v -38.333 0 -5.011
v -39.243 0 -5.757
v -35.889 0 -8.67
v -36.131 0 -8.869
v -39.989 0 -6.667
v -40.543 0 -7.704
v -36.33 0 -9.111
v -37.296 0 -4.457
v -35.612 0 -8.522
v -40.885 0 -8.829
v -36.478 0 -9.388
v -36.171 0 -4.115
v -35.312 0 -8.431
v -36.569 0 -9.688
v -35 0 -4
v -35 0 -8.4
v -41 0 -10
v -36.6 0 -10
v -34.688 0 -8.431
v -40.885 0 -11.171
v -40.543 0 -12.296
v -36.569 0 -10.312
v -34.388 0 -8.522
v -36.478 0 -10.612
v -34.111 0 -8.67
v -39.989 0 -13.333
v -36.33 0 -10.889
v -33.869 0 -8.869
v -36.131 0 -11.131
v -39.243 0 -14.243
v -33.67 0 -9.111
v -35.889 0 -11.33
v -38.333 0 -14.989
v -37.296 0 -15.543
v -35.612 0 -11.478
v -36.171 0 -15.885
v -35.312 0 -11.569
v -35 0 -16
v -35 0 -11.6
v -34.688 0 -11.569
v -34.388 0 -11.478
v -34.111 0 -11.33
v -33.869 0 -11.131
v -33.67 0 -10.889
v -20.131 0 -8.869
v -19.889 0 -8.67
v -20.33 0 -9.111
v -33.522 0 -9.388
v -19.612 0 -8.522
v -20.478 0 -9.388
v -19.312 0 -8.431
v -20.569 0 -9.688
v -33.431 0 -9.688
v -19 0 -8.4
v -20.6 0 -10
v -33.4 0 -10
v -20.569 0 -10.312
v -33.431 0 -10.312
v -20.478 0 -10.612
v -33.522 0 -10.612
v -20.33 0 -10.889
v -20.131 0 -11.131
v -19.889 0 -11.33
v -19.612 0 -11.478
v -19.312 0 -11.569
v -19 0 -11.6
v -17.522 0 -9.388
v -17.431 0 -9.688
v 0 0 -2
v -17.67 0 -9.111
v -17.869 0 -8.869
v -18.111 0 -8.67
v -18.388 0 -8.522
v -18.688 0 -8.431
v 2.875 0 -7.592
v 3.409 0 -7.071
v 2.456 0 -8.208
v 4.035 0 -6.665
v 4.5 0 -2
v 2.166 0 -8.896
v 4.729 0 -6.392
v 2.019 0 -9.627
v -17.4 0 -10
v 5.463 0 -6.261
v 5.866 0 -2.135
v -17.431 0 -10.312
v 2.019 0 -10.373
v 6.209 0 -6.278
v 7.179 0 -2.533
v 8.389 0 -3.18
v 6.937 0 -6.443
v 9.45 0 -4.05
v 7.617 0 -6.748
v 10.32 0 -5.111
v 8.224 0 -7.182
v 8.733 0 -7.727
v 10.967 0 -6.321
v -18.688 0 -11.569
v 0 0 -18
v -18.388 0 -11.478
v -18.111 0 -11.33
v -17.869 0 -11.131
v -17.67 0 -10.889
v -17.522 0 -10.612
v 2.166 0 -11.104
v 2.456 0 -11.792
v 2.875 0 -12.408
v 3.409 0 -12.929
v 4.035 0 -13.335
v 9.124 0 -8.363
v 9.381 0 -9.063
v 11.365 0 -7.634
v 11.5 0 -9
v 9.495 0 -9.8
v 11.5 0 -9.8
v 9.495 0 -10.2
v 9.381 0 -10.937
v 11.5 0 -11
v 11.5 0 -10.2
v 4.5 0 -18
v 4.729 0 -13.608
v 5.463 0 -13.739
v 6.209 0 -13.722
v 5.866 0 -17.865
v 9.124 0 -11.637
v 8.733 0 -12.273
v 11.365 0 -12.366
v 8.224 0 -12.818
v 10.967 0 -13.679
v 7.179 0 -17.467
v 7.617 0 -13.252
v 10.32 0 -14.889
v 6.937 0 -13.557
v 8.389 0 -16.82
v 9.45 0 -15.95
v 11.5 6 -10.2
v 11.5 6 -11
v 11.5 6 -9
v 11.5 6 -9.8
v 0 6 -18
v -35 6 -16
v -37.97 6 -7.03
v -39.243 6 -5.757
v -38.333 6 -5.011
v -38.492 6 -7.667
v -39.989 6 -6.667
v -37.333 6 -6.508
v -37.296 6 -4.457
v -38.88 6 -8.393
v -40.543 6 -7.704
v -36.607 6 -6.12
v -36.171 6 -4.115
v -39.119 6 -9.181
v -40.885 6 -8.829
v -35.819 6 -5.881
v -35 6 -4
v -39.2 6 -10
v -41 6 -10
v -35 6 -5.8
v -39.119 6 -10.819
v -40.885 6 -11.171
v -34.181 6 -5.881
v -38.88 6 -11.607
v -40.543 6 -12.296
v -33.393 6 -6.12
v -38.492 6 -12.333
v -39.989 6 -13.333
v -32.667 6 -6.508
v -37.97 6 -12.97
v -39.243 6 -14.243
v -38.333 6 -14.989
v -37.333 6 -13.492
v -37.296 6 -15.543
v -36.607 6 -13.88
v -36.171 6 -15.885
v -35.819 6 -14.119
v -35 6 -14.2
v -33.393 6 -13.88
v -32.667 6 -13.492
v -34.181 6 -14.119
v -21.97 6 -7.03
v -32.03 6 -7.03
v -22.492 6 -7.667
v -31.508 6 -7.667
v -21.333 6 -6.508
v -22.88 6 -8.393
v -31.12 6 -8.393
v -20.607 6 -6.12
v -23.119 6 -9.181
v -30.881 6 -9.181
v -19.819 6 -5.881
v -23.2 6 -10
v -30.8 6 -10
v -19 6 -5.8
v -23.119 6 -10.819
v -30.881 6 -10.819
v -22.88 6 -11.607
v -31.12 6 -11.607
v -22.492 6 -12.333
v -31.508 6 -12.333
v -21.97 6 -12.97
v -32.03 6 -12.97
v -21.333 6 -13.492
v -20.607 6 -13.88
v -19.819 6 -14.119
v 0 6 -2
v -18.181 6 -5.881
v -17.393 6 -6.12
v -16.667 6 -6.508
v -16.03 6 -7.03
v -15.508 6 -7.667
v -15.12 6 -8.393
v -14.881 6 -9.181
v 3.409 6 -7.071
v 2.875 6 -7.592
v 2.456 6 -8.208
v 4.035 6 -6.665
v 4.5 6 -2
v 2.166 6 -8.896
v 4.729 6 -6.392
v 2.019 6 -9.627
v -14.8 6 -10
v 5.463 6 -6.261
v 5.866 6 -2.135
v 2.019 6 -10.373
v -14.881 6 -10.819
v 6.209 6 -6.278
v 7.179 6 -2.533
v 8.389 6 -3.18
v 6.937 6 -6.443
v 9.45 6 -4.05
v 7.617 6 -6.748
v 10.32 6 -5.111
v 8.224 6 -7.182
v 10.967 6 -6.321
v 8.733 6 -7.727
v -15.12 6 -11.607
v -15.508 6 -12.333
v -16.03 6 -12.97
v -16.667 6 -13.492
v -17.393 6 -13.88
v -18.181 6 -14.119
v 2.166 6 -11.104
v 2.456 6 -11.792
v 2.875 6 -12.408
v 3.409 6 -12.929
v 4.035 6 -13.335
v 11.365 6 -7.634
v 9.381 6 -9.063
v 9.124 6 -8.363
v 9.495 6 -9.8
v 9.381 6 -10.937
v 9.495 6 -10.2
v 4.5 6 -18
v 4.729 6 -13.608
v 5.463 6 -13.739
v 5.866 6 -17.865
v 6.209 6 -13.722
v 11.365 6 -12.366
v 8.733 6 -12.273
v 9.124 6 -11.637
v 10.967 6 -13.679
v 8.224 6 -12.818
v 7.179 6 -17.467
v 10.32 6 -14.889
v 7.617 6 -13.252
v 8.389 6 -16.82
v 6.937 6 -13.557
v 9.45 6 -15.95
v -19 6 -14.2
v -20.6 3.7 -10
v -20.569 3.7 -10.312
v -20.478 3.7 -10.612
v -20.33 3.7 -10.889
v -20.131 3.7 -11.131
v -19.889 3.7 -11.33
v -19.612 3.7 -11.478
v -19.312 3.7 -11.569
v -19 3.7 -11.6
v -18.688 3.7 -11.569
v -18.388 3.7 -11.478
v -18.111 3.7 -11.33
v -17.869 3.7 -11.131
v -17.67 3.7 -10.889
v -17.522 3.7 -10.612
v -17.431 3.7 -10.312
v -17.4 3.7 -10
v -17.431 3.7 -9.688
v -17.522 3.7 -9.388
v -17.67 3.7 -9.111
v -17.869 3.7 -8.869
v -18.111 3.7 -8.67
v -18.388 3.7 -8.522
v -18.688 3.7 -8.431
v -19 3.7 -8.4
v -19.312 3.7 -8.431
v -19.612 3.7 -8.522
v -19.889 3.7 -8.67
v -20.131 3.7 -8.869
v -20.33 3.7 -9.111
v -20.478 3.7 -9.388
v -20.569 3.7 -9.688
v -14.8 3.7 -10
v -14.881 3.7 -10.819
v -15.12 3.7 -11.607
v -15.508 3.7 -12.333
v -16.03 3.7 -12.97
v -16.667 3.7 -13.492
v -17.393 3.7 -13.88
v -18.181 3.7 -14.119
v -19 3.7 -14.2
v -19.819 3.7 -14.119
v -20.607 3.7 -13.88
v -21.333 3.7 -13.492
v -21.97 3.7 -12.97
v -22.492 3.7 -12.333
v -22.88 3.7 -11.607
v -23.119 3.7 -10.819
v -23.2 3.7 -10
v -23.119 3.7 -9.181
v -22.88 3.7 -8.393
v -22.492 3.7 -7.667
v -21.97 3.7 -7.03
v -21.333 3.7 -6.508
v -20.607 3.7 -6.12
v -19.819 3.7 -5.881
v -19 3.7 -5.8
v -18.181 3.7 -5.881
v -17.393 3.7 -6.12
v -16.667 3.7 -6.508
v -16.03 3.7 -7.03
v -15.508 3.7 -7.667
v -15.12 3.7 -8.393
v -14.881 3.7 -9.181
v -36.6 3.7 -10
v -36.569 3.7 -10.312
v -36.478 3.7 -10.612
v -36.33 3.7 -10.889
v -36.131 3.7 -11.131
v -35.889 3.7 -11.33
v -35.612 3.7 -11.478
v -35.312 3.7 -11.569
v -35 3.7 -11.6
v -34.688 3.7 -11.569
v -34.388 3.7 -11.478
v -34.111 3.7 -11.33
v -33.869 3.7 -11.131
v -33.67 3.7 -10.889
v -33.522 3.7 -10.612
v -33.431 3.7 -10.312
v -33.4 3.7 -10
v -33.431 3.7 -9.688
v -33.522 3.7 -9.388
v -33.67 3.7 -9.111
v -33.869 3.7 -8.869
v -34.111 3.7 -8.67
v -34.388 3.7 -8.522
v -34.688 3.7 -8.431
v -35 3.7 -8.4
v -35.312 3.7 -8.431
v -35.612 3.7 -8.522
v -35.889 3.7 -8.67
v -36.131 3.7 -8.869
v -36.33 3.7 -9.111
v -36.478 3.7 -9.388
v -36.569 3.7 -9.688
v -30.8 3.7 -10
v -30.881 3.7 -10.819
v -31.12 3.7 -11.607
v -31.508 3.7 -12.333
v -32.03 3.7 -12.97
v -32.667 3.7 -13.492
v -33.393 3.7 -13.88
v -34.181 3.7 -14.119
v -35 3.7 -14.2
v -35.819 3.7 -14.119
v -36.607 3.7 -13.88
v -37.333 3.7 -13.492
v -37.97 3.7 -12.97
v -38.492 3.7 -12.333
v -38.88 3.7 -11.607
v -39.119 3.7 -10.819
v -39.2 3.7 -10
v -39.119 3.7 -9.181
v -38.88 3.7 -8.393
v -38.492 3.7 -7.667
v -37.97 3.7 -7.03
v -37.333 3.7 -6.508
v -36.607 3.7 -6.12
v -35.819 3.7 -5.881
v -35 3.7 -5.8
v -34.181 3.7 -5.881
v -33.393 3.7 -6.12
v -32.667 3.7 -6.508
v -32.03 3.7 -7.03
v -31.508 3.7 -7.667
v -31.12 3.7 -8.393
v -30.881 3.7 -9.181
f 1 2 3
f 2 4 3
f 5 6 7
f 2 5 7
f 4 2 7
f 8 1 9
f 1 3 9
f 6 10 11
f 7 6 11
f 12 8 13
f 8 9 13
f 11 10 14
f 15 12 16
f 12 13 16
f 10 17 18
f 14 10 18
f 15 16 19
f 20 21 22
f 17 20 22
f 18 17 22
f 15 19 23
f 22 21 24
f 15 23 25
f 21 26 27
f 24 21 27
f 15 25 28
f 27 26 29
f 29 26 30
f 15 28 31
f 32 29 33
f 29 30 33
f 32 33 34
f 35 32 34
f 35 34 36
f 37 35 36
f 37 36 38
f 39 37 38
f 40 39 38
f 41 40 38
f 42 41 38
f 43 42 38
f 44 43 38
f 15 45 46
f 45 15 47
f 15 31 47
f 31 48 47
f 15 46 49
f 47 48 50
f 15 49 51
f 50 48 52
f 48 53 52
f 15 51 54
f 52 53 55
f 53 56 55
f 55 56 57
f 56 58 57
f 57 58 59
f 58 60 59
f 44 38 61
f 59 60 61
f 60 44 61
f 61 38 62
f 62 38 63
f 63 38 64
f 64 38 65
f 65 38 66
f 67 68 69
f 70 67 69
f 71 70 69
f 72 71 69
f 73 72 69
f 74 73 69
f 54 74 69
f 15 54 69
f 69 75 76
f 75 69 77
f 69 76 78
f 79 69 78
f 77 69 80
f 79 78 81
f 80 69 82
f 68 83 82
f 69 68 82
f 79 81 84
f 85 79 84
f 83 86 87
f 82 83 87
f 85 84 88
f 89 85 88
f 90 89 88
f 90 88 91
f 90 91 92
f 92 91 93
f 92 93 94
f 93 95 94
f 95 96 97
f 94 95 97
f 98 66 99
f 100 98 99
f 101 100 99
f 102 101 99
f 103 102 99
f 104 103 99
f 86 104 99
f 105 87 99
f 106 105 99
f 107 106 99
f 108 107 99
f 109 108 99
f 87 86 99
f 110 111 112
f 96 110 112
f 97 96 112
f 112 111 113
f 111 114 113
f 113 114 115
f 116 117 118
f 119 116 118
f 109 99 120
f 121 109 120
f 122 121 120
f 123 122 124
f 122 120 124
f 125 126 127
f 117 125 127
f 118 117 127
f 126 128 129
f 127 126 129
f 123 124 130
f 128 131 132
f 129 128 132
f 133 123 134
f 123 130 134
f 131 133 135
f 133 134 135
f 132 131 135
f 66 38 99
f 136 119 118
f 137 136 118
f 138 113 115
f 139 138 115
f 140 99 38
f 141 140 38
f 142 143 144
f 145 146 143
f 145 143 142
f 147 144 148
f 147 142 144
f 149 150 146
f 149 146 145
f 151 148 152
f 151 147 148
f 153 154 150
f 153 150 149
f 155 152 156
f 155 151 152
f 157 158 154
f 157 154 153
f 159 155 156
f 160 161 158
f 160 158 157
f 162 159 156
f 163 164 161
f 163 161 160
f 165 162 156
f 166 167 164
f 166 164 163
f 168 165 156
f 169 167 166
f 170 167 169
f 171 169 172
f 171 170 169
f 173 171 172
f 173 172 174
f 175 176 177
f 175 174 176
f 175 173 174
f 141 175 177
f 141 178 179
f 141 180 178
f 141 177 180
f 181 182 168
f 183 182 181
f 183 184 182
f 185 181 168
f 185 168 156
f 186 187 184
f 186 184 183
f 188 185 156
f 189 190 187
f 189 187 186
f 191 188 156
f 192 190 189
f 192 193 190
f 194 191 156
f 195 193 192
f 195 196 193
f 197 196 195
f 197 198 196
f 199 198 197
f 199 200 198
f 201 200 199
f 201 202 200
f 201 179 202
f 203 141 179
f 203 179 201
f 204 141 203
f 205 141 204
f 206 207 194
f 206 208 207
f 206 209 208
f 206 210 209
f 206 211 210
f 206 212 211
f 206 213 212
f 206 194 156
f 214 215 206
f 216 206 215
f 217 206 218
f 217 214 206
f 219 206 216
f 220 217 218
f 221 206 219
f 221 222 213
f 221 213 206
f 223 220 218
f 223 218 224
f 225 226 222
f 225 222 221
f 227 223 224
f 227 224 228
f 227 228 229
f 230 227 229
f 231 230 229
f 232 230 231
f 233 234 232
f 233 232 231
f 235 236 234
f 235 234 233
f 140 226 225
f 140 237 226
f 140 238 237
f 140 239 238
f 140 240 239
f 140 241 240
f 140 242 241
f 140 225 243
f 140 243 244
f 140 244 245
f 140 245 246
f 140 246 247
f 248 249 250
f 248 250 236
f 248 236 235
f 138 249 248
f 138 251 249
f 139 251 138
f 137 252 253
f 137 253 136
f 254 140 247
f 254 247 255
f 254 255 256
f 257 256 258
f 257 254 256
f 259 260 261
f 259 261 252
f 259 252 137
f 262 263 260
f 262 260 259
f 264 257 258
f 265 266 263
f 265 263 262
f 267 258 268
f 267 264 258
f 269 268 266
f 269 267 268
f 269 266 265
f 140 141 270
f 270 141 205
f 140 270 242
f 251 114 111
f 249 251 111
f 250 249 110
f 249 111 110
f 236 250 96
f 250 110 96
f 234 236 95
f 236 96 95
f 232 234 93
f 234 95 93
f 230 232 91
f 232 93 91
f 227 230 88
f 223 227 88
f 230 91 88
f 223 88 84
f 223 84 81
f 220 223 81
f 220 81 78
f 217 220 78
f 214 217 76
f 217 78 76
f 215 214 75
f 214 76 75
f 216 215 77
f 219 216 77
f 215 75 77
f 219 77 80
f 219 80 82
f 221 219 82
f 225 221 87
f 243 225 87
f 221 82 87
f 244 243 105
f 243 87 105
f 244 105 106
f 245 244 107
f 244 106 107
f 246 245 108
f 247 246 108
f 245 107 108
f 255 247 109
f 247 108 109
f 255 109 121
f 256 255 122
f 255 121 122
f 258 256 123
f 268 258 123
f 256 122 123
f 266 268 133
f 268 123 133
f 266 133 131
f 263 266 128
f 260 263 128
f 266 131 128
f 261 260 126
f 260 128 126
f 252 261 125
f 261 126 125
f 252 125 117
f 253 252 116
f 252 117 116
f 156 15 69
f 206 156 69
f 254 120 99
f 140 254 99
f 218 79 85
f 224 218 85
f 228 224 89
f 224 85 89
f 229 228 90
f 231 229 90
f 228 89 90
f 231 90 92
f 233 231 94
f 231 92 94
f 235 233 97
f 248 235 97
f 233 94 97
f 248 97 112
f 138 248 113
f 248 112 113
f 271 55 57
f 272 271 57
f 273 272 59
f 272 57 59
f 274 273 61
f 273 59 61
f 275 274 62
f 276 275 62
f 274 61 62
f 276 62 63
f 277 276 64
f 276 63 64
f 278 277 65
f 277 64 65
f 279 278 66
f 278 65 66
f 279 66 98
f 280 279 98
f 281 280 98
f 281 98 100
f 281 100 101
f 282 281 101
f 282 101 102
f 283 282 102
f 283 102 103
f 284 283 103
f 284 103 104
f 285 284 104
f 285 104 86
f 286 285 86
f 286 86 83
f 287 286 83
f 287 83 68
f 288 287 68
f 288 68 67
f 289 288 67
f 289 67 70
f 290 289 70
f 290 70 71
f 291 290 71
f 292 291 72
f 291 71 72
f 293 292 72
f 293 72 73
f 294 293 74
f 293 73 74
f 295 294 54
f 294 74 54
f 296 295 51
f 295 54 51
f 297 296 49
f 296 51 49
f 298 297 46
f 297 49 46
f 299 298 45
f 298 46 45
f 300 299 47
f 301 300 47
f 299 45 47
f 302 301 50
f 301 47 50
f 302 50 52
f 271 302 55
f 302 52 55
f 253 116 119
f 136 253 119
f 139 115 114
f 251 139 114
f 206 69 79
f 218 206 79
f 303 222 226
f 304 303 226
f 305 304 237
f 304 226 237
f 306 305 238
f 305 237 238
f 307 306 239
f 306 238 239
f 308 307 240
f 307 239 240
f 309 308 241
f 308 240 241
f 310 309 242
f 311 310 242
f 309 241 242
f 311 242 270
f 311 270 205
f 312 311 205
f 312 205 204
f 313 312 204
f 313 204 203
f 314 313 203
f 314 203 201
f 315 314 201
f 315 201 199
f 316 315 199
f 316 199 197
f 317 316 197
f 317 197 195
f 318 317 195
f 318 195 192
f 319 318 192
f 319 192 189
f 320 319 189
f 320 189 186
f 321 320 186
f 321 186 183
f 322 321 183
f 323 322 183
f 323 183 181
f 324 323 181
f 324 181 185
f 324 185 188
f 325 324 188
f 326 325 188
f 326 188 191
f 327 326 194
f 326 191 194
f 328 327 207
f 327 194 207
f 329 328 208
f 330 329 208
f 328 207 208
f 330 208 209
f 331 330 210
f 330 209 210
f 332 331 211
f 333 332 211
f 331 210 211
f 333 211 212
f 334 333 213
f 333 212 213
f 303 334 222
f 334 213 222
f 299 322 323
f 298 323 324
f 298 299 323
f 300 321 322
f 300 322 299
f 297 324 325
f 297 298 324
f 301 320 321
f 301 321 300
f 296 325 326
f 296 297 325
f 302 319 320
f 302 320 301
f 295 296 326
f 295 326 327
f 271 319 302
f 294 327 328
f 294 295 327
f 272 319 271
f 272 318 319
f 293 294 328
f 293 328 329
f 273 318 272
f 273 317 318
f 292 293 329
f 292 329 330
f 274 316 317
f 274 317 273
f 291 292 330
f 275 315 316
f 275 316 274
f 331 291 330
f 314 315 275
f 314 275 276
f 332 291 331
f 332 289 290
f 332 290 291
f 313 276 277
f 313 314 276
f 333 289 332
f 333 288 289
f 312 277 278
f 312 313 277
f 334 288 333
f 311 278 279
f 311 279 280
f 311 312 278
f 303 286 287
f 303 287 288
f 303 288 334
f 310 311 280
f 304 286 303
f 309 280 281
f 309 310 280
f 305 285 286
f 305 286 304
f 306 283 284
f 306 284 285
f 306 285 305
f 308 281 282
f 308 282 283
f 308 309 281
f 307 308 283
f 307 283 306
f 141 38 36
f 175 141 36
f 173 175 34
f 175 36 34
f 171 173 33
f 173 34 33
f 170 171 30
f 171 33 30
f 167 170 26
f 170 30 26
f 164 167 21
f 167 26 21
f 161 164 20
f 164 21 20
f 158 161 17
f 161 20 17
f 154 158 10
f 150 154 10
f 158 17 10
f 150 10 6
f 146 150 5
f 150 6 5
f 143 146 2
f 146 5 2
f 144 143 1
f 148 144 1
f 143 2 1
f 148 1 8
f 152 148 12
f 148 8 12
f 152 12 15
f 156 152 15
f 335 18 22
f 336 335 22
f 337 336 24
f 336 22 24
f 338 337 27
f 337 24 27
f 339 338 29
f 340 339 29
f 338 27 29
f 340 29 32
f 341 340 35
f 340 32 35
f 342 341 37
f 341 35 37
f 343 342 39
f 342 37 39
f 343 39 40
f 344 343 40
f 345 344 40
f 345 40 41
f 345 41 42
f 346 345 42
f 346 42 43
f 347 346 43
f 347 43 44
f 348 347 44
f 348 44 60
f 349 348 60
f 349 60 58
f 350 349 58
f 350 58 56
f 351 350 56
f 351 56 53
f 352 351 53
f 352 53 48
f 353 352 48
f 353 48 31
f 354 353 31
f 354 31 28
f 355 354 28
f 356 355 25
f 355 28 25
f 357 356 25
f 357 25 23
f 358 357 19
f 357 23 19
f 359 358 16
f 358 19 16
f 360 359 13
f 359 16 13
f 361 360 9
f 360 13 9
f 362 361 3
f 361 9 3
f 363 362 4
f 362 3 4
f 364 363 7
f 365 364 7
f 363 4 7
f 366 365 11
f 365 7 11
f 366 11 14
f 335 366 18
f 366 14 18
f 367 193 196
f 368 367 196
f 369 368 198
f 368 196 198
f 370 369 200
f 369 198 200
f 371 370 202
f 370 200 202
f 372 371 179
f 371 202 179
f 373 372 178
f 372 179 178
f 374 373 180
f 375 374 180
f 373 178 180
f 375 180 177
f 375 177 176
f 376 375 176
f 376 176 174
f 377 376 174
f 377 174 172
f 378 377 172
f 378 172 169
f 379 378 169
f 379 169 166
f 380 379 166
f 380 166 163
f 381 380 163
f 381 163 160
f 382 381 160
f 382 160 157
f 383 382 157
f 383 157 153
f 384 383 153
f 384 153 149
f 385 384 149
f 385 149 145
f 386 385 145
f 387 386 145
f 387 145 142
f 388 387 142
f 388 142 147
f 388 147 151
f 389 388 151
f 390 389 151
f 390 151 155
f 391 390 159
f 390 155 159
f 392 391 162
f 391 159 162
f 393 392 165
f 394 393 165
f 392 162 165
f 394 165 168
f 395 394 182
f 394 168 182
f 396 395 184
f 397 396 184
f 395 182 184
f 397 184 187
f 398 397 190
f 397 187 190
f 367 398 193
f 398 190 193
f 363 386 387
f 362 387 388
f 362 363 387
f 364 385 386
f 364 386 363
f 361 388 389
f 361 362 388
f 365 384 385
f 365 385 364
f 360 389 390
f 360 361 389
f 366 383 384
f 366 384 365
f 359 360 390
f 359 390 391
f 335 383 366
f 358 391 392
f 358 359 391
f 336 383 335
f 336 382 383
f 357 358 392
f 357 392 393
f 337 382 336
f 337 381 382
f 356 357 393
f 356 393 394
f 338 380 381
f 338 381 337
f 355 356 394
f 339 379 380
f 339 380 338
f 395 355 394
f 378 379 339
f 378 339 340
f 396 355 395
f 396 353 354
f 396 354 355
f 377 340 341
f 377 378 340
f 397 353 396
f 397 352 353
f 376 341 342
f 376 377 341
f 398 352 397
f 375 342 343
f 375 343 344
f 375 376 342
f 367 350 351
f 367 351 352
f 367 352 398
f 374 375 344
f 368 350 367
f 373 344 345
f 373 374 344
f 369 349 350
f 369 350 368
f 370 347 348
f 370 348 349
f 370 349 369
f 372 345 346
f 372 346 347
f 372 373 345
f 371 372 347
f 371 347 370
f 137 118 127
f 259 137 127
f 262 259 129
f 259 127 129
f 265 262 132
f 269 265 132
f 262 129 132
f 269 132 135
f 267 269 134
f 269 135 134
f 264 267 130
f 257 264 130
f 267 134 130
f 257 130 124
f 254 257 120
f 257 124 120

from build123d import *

# Parameters (mm, degrees)
SKETCH1_R                                        = 1.5
BOSS_EXTRUDE1_DEPTH                              = 6
CBORE_FOR_M3_HEX_HEAD_MACHINE_SCREW1_D           = 3.2
CBORE_FOR_M3_HEX_HEAD_MACHINE_SCREW1_DEPTH       = 6
CBORE_FOR_M3_HEX_HEAD_MACHINE_SCREW1_CBORE_D     = 8.4
CBORE_FOR_M3_HEX_HEAD_MACHINE_SCREW1_CBORE_DEPTH = 2.3


with BuildPart() as part:
    # Sketch1 → Boss-Extrude1 (new body)
    with BuildSketch(Plane(origin=(0, 0, 0), x_dir=(1, 0, 0), z_dir=(0, 1, 0))):
        with BuildLine():
            Line((11.5, 10.2), (11.5, 11))
            ThreePointArc((11.5, 11), (9.449747468, 15.949747468), (4.5, 18))
            Line((4.5, 18), (0, 18))
            Line((0, 18), (-35, 16))
            ThreePointArc((-35, 16), (-41, 10), (-35, 4))
            Line((-35, 4), (0, 2))
            Line((0, 2), (4.5, 2))
            ThreePointArc((4.5, 2), (9.449747468, 4.050252532), (11.5, 9))
            Line((11.5, 9), (11.5, 9.8))
            Line((11.5, 9.8), (9.494662869, 9.8))
            ThreePointArc((9.494662869, 9.8), (2, 10), (9.494662869, 10.2))
            Line((9.494662869, 10.2), (11.5, 10.2))
        make_face()
        with Locations(Location((-35, 10, 0), (0, 0, 270))):
            Circle(SKETCH1_R, mode=Mode.SUBTRACT)
        with Locations(Location((-19, 10, 0), (0, 0, 270))):
            Circle(SKETCH1_R, mode=Mode.SUBTRACT)
    extrude(amount=BOSS_EXTRUDE1_DEPTH)

    # CBORE for M3 Hex Head Machine Screw1
    with Locations(Plane(origin=(0, 6, 0), x_dir=(1, 0, 0), z_dir=(0, 1, 0))):
        with Locations((-19, 10), (-35, 10)):
            CounterBoreHole(CBORE_FOR_M3_HEX_HEAD_MACHINE_SCREW1_D / 2, CBORE_FOR_M3_HEX_HEAD_MACHINE_SCREW1_CBORE_D / 2, CBORE_FOR_M3_HEX_HEAD_MACHINE_SCREW1_CBORE_DEPTH, depth=CBORE_FOR_M3_HEX_HEAD_MACHINE_SCREW1_DEPTH)


solid = part.part
